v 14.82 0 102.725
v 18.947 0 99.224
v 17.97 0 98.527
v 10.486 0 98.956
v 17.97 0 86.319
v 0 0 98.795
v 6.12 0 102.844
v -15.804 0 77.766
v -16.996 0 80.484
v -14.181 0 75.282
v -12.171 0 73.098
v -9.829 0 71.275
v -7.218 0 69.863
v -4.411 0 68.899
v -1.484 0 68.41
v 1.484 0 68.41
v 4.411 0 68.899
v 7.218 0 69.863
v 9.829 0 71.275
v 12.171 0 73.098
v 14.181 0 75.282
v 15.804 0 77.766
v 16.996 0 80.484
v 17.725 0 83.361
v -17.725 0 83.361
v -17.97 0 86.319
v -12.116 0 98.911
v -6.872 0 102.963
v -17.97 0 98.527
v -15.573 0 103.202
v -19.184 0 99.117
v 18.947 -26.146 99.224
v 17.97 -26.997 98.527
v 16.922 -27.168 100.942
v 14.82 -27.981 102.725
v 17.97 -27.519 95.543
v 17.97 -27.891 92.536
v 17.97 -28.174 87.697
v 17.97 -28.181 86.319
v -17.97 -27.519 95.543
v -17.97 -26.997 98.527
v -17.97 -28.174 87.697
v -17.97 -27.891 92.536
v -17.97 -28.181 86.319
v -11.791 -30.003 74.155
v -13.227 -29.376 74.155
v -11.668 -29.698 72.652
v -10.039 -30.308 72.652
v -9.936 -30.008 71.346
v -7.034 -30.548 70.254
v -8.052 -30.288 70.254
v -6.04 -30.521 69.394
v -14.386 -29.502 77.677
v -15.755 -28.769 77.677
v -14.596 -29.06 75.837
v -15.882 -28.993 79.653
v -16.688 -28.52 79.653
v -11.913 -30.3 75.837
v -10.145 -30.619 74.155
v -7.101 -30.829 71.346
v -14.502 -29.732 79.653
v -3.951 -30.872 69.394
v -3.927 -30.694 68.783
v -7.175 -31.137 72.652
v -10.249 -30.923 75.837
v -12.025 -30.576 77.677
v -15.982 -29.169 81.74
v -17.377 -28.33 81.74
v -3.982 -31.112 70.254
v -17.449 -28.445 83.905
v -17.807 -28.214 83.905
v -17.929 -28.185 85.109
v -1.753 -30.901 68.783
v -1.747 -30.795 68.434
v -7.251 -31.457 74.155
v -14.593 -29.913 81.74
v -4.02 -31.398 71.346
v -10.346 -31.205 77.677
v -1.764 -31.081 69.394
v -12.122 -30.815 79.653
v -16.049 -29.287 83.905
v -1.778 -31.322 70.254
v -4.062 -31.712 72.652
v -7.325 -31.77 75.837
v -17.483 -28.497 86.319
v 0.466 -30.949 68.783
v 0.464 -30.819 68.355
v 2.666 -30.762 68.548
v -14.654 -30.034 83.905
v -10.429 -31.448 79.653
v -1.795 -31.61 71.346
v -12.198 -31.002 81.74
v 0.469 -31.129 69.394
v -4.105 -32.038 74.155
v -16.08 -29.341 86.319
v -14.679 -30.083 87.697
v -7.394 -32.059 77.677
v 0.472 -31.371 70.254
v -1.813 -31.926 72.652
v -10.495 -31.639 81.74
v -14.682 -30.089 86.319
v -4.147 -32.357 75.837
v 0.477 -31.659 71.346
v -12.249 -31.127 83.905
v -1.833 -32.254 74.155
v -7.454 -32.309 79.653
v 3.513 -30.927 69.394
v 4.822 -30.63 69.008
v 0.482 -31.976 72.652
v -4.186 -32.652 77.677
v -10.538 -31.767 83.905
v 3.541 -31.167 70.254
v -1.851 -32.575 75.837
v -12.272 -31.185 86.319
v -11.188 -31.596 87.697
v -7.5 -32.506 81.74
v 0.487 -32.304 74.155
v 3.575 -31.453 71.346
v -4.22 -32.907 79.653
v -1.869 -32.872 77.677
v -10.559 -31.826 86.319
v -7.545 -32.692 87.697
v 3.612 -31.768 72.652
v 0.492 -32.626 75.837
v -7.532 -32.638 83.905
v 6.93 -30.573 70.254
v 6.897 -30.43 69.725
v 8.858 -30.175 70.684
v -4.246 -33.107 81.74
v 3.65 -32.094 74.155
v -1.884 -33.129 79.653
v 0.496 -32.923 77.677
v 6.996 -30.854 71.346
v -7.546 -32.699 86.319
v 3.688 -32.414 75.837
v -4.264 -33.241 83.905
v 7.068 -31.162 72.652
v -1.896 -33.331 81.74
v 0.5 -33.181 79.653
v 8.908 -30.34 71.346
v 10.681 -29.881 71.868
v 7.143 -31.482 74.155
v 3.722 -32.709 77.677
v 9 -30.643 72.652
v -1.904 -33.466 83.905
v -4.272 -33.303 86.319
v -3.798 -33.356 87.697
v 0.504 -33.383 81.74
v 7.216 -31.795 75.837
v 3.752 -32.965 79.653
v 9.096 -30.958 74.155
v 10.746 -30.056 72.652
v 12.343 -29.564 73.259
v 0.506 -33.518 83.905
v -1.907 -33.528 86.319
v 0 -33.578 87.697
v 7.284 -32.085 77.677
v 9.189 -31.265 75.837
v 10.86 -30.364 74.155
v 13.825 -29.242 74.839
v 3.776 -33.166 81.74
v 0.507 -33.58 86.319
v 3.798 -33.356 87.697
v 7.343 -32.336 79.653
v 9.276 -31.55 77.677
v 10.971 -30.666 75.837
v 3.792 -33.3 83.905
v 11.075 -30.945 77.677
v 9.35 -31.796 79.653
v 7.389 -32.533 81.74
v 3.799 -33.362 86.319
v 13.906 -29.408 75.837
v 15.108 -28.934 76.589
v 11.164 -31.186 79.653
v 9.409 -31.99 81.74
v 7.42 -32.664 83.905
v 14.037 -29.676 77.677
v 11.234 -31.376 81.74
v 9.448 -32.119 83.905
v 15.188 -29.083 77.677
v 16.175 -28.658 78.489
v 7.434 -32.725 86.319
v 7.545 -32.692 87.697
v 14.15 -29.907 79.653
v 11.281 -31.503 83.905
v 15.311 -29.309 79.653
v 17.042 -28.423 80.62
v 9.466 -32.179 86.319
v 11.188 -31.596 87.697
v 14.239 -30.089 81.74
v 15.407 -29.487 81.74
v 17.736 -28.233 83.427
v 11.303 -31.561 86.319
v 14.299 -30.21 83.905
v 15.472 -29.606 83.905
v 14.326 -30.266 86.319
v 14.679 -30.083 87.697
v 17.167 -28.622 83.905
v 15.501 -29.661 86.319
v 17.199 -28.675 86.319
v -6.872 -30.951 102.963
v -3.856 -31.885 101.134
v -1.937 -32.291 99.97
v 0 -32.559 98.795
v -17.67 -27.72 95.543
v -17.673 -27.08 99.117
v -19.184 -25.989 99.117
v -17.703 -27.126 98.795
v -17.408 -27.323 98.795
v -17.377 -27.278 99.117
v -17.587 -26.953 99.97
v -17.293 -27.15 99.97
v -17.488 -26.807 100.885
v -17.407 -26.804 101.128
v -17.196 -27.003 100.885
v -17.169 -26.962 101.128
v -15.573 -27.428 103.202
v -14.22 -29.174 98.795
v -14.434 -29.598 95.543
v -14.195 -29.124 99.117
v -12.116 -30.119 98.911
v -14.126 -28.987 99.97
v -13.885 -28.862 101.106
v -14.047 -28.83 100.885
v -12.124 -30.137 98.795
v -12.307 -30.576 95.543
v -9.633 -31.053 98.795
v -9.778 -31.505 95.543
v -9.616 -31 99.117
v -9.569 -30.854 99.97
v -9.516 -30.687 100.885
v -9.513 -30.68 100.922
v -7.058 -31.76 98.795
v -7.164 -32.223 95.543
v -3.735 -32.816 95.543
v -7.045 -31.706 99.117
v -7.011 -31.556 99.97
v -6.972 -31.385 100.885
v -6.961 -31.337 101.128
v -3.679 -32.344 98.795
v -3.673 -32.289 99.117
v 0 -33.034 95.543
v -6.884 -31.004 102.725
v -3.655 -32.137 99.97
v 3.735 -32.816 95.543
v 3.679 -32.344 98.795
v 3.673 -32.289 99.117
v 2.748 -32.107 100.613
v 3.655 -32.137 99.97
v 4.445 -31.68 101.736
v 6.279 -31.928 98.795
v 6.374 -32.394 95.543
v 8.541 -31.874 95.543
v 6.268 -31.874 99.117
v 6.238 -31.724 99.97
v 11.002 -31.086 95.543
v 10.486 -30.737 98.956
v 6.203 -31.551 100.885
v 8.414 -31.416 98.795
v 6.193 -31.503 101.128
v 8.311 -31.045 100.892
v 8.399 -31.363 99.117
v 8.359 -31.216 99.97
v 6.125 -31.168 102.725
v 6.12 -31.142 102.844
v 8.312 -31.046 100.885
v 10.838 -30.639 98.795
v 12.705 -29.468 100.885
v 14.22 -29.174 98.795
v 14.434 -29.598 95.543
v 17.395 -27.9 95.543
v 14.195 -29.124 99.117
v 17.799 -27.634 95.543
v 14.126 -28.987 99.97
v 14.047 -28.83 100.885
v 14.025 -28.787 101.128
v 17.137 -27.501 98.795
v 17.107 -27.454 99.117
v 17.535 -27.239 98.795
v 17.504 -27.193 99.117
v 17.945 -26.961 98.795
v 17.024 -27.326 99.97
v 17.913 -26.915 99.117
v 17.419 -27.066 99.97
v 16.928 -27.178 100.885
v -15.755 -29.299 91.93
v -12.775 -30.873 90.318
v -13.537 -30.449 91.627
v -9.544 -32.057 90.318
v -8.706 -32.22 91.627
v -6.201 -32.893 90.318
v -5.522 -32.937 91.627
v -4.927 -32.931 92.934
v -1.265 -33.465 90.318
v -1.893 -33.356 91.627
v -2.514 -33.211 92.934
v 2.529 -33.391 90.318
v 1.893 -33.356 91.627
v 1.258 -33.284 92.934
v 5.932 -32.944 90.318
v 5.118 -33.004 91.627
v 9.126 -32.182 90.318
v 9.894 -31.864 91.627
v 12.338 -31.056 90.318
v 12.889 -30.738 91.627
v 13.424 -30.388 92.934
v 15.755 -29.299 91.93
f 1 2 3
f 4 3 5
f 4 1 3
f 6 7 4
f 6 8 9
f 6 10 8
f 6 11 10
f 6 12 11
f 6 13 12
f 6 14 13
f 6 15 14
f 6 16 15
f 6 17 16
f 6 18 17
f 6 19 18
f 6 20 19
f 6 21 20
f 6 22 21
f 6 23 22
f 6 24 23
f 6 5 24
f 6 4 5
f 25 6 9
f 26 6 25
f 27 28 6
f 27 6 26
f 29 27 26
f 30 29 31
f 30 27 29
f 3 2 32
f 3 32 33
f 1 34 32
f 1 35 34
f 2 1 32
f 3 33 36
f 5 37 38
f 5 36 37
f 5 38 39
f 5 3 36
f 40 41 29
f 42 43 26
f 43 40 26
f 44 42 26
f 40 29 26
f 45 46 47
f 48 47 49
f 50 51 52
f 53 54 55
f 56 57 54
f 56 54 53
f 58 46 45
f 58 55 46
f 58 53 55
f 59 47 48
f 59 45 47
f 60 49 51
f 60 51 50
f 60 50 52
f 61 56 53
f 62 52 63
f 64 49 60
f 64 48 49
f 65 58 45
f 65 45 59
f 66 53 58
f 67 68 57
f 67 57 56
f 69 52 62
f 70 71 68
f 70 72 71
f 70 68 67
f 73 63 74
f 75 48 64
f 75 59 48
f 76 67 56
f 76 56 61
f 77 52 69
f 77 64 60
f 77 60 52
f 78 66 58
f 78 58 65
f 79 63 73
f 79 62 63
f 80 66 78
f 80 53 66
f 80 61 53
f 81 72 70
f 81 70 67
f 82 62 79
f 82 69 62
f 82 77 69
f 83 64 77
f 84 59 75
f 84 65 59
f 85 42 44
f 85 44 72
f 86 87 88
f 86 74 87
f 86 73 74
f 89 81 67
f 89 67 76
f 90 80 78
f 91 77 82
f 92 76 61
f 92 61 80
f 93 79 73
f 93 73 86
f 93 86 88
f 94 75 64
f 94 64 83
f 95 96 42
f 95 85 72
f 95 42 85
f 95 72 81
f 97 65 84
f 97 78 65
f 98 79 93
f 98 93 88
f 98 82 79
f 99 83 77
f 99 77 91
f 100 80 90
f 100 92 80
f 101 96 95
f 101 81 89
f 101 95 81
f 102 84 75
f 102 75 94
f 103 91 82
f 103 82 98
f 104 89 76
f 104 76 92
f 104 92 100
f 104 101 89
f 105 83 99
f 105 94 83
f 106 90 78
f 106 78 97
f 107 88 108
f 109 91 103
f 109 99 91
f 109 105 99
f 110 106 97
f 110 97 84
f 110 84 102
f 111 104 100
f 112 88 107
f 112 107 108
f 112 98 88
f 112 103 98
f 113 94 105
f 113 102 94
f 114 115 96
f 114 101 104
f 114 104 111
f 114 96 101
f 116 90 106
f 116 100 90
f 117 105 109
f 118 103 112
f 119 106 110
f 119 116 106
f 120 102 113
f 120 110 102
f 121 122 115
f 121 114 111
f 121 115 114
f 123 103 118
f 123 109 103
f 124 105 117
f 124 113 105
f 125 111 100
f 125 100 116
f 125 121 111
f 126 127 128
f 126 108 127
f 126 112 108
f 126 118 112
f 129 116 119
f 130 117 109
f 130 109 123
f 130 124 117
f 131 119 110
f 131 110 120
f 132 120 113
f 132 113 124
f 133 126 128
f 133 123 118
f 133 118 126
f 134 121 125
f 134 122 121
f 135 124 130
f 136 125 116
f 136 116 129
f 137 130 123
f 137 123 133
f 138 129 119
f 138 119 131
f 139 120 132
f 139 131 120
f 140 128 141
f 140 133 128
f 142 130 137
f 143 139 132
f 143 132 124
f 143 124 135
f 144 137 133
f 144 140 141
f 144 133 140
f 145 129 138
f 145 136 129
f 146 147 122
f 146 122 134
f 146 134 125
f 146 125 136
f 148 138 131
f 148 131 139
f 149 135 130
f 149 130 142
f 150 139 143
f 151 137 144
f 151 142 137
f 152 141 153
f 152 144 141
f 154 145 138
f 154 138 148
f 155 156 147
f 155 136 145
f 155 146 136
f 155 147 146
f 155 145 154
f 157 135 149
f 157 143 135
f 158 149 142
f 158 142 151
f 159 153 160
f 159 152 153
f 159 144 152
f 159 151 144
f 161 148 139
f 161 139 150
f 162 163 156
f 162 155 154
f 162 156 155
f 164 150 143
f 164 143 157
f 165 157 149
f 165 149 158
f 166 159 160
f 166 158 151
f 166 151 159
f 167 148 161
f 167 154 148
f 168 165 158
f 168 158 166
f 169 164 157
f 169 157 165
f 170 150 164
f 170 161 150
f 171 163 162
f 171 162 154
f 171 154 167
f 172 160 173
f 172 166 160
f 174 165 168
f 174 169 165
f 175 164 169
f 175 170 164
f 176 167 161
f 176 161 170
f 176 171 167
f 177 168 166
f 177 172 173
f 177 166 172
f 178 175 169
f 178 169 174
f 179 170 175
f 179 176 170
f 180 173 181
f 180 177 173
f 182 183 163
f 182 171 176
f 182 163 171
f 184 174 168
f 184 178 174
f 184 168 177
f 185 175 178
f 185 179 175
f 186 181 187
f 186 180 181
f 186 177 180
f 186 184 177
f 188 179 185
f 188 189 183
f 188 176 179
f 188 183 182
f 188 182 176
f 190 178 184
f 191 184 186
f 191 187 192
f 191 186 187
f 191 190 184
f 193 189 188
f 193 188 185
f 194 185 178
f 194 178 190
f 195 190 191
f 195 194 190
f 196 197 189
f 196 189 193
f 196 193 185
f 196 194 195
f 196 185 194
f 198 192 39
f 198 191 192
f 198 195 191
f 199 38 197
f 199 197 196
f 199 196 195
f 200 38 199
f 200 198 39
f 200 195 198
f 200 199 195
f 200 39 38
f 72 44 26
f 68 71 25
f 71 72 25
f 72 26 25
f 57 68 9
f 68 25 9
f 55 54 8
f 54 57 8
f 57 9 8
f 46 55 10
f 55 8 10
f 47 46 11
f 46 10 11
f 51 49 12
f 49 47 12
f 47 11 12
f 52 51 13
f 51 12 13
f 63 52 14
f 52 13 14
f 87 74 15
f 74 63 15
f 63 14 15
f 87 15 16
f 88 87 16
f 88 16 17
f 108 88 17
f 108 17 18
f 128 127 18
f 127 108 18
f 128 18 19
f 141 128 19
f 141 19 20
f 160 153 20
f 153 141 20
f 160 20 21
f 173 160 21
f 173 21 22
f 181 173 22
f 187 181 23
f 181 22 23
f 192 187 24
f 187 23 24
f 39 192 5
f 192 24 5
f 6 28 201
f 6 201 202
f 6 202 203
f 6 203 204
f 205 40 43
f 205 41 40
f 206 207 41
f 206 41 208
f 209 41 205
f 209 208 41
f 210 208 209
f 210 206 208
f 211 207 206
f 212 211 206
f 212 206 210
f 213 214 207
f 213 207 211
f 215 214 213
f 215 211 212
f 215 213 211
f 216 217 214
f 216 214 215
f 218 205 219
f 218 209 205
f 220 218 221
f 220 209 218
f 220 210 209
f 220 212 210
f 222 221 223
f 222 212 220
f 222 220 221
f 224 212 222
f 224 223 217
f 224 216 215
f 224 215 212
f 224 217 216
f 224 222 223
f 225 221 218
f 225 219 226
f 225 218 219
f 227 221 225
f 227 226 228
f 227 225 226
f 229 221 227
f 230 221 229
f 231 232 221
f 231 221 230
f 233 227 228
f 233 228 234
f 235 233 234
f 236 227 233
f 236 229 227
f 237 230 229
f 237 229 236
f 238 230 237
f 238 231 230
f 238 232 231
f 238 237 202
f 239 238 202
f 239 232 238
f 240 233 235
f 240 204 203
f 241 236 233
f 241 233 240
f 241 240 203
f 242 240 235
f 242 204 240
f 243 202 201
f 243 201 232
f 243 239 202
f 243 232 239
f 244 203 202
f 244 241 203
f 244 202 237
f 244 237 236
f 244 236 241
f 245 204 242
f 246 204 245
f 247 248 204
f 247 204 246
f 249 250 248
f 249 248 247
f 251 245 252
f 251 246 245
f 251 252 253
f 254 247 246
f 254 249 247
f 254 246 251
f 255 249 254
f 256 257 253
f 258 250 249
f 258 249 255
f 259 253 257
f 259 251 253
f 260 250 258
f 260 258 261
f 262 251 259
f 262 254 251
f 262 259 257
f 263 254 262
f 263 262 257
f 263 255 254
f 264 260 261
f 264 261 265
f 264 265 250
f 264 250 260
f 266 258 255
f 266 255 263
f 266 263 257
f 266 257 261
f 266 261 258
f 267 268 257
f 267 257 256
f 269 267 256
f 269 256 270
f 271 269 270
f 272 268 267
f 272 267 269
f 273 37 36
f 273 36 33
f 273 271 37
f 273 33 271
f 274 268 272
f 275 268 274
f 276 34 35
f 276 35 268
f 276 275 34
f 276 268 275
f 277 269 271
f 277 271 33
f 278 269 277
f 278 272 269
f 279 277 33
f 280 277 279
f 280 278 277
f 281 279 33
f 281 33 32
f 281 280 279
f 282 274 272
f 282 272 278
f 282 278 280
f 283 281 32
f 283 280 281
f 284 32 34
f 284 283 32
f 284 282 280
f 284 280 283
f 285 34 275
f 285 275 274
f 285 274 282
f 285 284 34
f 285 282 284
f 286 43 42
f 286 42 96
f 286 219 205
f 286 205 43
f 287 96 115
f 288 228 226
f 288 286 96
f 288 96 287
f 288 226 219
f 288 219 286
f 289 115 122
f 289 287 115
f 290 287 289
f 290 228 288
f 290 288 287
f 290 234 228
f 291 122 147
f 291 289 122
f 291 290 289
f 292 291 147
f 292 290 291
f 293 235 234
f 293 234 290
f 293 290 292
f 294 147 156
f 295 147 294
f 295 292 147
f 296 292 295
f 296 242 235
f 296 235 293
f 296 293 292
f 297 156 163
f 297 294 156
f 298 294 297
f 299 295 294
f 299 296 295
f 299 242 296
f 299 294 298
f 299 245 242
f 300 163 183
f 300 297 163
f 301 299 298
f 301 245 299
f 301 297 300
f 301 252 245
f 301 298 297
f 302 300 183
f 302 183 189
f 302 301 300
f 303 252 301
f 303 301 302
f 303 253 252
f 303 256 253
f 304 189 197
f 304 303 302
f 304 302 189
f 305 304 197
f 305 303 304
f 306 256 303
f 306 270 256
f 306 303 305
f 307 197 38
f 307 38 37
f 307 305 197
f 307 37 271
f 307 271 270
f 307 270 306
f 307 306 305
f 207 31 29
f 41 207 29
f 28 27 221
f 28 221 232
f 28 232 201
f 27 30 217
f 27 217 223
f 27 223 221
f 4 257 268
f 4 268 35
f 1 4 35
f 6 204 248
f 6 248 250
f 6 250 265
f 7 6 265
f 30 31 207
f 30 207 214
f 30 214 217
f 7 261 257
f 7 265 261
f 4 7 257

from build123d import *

# Parameters (mm, degrees)
EXTRUDE001_DEPTH = 100


with BuildPart() as body002:
    # Sketch → Revolution (revolve)
    with BuildSketch(Plane.XZ):
        with BuildLine():
            Line((0, 0), (0, 135.563389))
            ThreePointArc((23.86226, 121.281178), (13.904936, 131.720055), (0, 135.563389))
            ThreePointArc((32.577943, 87.696618), (30.229669, 105.01041), (23.86226, 121.281178))
            ThreePointArc((22.101567, 52.101534), (30.047255, 69.102202), (32.577943, 87.696618))
            ThreePointArc((22.101567, 52.101534), (13.488015, 26.476163), (18.952965, 0))
            Line((0, 0), (18.952965, 0))
        make_face()
    revolve(axis=Axis((0, 0, 0), (0, 0, 1)))


with BuildPart() as body002_1:
    # Clone001 placement: moved
    add(body002.part.moved(Location((0, -1, 0))))


with BuildPart() as common001:
    # Sketch014 → Extrude001 (new body)
    with BuildSketch(Plane.XZ):
        with BuildLine():
            Line((-19.184126, 99.1166), (-15.572962, 103.201874))
            Line((-15.572962, 103.201874), (-12.116452, 98.911034))
            Line((-12.116452, 98.911034), (-6.872091, 102.963493))
            Line((-6.872091, 102.963493), (0, 98.795265))
            Line((0, 98.795265), (6.11962, 102.844307))
            Line((6.11962, 102.844307), (10.485641, 98.955933))
            Line((10.485641, 98.955933), (14.820494, 102.725113))
            Line((14.820494, 102.725113), (18.947416, 99.223709))
            Line((18.947416, 99.223709), (17.97, 98.527489))
            Line((17.97, 98.527489), (17.97, 86.319122))
            ThreePointArc((-17.97, 86.319122), (0, 68.349122), (17.97, 86.319122))
            Line((-17.97, 98.527489), (-17.97, 86.319122))
            Line((-19.184126, 99.1166), (-17.97, 98.527489))
        make_face()
    extrude(amount=EXTRUDE001_DEPTH)

    # Common001: intersect Body002
    add(body002_1.part, mode=Mode.INTERSECT)


solid = common001.part
